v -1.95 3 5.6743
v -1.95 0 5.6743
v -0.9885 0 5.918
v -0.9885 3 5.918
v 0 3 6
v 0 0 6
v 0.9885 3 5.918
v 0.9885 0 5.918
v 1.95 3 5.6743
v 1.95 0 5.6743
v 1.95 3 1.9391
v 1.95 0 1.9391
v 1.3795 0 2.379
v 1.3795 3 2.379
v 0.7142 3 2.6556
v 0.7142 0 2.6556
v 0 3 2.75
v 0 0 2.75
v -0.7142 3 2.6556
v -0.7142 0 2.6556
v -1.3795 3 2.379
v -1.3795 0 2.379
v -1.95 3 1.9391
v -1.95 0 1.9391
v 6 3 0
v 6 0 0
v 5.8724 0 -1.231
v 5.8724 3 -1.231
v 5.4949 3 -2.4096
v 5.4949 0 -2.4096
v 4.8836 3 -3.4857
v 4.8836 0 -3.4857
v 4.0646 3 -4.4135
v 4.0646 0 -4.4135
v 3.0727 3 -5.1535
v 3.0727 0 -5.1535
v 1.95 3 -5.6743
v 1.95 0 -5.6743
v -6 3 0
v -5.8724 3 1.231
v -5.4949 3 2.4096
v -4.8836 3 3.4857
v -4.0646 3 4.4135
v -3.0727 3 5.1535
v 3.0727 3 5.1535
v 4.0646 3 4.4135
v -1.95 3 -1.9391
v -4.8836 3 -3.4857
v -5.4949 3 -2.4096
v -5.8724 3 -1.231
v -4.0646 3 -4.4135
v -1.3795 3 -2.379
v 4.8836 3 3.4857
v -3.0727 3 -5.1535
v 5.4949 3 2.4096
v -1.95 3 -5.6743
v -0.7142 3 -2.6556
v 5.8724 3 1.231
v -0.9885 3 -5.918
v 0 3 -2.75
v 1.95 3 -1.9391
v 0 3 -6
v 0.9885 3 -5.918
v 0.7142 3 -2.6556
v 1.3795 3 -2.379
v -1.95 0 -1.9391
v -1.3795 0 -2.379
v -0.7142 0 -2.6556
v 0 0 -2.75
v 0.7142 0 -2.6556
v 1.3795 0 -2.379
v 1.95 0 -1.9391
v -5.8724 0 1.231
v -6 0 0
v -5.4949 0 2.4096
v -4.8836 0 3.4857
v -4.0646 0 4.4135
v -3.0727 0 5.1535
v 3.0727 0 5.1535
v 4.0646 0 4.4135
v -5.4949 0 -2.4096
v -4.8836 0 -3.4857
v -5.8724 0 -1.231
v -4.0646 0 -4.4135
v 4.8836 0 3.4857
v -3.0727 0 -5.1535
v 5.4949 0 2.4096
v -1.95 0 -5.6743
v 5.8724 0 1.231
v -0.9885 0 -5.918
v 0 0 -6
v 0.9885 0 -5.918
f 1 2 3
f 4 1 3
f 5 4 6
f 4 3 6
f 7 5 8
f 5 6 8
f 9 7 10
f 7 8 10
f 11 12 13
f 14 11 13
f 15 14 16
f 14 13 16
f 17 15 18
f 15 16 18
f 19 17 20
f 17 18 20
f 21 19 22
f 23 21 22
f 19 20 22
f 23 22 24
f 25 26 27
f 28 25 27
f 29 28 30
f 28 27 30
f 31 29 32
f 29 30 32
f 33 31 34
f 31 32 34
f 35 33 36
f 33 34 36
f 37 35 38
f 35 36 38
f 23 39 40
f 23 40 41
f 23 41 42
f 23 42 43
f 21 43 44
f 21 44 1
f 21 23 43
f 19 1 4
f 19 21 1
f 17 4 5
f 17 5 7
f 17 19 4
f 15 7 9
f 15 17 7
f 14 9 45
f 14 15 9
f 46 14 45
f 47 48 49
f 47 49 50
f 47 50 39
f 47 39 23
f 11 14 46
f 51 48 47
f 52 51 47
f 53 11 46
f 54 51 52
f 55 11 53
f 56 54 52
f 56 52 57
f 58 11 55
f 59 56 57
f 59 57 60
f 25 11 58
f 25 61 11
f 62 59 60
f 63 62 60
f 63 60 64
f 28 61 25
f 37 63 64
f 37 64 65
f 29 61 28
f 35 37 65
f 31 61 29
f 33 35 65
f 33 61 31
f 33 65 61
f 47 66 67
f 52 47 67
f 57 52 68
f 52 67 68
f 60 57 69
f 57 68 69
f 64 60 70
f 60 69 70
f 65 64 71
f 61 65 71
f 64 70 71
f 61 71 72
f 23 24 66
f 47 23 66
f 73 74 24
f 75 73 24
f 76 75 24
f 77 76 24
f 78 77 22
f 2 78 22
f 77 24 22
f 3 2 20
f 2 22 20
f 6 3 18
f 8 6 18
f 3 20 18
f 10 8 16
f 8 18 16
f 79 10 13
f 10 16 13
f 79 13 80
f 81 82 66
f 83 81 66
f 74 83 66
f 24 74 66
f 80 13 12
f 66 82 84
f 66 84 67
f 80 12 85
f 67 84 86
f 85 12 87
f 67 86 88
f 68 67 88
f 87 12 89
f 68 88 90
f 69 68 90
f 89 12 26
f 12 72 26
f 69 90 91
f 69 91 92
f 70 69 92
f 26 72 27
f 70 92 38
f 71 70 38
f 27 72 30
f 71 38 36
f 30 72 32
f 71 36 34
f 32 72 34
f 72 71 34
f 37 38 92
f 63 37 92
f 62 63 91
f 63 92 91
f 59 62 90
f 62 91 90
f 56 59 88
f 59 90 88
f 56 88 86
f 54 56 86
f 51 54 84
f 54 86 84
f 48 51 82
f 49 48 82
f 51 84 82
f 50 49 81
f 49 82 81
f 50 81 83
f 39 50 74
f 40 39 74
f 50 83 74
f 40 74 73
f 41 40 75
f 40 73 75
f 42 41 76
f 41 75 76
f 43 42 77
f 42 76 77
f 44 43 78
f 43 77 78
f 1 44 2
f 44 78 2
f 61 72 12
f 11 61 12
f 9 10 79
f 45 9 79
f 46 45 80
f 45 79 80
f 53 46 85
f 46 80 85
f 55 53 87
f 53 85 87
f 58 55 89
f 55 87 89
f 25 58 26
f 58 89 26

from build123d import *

# Parameters (mm, degrees)
BOSS_EXTRUDE1_DEPTH = 3


with BuildPart() as part:
    # Sketch1 → Boss-Extrude1 (new body)
    with BuildSketch(Plane(origin=(0, 0, 0), x_dir=(1, 0, 0), z_dir=(0, 1, 0))):
        with BuildLine():
            ThreePointArc((2.75, 0), (2.542144764, 1.048808848), (1.95, 1.939071943))
            Line((1.95, 1.939071943), (1.95, -1.939071943))
            ThreePointArc((1.95, -1.939071943), (2.542144764, -1.048808848), (2.75, 0))
        make_face()
        with BuildLine():
            ThreePointArc((1.95, 5.674284096), (0, 6), (-1.95, 5.674284096))
            Line((-1.95, 5.674284096), (-1.95, 1.939071943))
            ThreePointArc((-1.95, 1.939071943), (0, 2.75), (1.95, 1.939071943))
            Line((1.95, 1.939071943), (1.95, 5.674284096))
        make_face()
        with BuildLine():
            Line((-1.95, -1.939071943), (-1.95, -5.674284096))
            ThreePointArc((-1.95, -5.674284096), (0, -6), (1.95, -5.674284096))
            Line((1.95, -5.674284096), (1.95, -1.939071943))
            ThreePointArc((1.95, -1.939071943), (0, -2.75), (-1.95, -1.939071943))
        make_face()
        with BuildLine():
            Line((-1.95, 1.939071943), (-1.95, 5.674284096))
            ThreePointArc((-1.95, 5.674284096), (-6, 0), (-1.95, -5.674284096))
            Line((-1.95, -5.674284096), (-1.95, -1.939071943))
            ThreePointArc((-1.95, -1.939071943), (-2.75, 0), (-1.95, 1.939071943))
        make_face()
        with BuildLine():
            ThreePointArc((6, 0), (4.883646179, 3.485685012), (1.95, 5.674284096))
            Line((1.95, 5.674284096), (1.95, 1.939071943))
            ThreePointArc((1.95, 1.939071943), (2.542144764, 1.048808848), (2.75, 0))
            ThreePointArc((2.75, 0), (2.542144764, -1.048808848), (1.95, -1.939071943))
            Line((1.95, -1.939071943), (1.95, -5.674284096))
            ThreePointArc((1.95, -5.674284096), (4.883646179, -3.485685012), (6, 0))
        make_face()
        with BuildLine():
            Line((-1.95, -1.939071943), (-1.95, 1.939071943))
            ThreePointArc((-1.95, 1.939071943), (-2.75, 0), (-1.95, -1.939071943))
        make_face()
    extrude(amount=BOSS_EXTRUDE1_DEPTH)


solid = part.part
